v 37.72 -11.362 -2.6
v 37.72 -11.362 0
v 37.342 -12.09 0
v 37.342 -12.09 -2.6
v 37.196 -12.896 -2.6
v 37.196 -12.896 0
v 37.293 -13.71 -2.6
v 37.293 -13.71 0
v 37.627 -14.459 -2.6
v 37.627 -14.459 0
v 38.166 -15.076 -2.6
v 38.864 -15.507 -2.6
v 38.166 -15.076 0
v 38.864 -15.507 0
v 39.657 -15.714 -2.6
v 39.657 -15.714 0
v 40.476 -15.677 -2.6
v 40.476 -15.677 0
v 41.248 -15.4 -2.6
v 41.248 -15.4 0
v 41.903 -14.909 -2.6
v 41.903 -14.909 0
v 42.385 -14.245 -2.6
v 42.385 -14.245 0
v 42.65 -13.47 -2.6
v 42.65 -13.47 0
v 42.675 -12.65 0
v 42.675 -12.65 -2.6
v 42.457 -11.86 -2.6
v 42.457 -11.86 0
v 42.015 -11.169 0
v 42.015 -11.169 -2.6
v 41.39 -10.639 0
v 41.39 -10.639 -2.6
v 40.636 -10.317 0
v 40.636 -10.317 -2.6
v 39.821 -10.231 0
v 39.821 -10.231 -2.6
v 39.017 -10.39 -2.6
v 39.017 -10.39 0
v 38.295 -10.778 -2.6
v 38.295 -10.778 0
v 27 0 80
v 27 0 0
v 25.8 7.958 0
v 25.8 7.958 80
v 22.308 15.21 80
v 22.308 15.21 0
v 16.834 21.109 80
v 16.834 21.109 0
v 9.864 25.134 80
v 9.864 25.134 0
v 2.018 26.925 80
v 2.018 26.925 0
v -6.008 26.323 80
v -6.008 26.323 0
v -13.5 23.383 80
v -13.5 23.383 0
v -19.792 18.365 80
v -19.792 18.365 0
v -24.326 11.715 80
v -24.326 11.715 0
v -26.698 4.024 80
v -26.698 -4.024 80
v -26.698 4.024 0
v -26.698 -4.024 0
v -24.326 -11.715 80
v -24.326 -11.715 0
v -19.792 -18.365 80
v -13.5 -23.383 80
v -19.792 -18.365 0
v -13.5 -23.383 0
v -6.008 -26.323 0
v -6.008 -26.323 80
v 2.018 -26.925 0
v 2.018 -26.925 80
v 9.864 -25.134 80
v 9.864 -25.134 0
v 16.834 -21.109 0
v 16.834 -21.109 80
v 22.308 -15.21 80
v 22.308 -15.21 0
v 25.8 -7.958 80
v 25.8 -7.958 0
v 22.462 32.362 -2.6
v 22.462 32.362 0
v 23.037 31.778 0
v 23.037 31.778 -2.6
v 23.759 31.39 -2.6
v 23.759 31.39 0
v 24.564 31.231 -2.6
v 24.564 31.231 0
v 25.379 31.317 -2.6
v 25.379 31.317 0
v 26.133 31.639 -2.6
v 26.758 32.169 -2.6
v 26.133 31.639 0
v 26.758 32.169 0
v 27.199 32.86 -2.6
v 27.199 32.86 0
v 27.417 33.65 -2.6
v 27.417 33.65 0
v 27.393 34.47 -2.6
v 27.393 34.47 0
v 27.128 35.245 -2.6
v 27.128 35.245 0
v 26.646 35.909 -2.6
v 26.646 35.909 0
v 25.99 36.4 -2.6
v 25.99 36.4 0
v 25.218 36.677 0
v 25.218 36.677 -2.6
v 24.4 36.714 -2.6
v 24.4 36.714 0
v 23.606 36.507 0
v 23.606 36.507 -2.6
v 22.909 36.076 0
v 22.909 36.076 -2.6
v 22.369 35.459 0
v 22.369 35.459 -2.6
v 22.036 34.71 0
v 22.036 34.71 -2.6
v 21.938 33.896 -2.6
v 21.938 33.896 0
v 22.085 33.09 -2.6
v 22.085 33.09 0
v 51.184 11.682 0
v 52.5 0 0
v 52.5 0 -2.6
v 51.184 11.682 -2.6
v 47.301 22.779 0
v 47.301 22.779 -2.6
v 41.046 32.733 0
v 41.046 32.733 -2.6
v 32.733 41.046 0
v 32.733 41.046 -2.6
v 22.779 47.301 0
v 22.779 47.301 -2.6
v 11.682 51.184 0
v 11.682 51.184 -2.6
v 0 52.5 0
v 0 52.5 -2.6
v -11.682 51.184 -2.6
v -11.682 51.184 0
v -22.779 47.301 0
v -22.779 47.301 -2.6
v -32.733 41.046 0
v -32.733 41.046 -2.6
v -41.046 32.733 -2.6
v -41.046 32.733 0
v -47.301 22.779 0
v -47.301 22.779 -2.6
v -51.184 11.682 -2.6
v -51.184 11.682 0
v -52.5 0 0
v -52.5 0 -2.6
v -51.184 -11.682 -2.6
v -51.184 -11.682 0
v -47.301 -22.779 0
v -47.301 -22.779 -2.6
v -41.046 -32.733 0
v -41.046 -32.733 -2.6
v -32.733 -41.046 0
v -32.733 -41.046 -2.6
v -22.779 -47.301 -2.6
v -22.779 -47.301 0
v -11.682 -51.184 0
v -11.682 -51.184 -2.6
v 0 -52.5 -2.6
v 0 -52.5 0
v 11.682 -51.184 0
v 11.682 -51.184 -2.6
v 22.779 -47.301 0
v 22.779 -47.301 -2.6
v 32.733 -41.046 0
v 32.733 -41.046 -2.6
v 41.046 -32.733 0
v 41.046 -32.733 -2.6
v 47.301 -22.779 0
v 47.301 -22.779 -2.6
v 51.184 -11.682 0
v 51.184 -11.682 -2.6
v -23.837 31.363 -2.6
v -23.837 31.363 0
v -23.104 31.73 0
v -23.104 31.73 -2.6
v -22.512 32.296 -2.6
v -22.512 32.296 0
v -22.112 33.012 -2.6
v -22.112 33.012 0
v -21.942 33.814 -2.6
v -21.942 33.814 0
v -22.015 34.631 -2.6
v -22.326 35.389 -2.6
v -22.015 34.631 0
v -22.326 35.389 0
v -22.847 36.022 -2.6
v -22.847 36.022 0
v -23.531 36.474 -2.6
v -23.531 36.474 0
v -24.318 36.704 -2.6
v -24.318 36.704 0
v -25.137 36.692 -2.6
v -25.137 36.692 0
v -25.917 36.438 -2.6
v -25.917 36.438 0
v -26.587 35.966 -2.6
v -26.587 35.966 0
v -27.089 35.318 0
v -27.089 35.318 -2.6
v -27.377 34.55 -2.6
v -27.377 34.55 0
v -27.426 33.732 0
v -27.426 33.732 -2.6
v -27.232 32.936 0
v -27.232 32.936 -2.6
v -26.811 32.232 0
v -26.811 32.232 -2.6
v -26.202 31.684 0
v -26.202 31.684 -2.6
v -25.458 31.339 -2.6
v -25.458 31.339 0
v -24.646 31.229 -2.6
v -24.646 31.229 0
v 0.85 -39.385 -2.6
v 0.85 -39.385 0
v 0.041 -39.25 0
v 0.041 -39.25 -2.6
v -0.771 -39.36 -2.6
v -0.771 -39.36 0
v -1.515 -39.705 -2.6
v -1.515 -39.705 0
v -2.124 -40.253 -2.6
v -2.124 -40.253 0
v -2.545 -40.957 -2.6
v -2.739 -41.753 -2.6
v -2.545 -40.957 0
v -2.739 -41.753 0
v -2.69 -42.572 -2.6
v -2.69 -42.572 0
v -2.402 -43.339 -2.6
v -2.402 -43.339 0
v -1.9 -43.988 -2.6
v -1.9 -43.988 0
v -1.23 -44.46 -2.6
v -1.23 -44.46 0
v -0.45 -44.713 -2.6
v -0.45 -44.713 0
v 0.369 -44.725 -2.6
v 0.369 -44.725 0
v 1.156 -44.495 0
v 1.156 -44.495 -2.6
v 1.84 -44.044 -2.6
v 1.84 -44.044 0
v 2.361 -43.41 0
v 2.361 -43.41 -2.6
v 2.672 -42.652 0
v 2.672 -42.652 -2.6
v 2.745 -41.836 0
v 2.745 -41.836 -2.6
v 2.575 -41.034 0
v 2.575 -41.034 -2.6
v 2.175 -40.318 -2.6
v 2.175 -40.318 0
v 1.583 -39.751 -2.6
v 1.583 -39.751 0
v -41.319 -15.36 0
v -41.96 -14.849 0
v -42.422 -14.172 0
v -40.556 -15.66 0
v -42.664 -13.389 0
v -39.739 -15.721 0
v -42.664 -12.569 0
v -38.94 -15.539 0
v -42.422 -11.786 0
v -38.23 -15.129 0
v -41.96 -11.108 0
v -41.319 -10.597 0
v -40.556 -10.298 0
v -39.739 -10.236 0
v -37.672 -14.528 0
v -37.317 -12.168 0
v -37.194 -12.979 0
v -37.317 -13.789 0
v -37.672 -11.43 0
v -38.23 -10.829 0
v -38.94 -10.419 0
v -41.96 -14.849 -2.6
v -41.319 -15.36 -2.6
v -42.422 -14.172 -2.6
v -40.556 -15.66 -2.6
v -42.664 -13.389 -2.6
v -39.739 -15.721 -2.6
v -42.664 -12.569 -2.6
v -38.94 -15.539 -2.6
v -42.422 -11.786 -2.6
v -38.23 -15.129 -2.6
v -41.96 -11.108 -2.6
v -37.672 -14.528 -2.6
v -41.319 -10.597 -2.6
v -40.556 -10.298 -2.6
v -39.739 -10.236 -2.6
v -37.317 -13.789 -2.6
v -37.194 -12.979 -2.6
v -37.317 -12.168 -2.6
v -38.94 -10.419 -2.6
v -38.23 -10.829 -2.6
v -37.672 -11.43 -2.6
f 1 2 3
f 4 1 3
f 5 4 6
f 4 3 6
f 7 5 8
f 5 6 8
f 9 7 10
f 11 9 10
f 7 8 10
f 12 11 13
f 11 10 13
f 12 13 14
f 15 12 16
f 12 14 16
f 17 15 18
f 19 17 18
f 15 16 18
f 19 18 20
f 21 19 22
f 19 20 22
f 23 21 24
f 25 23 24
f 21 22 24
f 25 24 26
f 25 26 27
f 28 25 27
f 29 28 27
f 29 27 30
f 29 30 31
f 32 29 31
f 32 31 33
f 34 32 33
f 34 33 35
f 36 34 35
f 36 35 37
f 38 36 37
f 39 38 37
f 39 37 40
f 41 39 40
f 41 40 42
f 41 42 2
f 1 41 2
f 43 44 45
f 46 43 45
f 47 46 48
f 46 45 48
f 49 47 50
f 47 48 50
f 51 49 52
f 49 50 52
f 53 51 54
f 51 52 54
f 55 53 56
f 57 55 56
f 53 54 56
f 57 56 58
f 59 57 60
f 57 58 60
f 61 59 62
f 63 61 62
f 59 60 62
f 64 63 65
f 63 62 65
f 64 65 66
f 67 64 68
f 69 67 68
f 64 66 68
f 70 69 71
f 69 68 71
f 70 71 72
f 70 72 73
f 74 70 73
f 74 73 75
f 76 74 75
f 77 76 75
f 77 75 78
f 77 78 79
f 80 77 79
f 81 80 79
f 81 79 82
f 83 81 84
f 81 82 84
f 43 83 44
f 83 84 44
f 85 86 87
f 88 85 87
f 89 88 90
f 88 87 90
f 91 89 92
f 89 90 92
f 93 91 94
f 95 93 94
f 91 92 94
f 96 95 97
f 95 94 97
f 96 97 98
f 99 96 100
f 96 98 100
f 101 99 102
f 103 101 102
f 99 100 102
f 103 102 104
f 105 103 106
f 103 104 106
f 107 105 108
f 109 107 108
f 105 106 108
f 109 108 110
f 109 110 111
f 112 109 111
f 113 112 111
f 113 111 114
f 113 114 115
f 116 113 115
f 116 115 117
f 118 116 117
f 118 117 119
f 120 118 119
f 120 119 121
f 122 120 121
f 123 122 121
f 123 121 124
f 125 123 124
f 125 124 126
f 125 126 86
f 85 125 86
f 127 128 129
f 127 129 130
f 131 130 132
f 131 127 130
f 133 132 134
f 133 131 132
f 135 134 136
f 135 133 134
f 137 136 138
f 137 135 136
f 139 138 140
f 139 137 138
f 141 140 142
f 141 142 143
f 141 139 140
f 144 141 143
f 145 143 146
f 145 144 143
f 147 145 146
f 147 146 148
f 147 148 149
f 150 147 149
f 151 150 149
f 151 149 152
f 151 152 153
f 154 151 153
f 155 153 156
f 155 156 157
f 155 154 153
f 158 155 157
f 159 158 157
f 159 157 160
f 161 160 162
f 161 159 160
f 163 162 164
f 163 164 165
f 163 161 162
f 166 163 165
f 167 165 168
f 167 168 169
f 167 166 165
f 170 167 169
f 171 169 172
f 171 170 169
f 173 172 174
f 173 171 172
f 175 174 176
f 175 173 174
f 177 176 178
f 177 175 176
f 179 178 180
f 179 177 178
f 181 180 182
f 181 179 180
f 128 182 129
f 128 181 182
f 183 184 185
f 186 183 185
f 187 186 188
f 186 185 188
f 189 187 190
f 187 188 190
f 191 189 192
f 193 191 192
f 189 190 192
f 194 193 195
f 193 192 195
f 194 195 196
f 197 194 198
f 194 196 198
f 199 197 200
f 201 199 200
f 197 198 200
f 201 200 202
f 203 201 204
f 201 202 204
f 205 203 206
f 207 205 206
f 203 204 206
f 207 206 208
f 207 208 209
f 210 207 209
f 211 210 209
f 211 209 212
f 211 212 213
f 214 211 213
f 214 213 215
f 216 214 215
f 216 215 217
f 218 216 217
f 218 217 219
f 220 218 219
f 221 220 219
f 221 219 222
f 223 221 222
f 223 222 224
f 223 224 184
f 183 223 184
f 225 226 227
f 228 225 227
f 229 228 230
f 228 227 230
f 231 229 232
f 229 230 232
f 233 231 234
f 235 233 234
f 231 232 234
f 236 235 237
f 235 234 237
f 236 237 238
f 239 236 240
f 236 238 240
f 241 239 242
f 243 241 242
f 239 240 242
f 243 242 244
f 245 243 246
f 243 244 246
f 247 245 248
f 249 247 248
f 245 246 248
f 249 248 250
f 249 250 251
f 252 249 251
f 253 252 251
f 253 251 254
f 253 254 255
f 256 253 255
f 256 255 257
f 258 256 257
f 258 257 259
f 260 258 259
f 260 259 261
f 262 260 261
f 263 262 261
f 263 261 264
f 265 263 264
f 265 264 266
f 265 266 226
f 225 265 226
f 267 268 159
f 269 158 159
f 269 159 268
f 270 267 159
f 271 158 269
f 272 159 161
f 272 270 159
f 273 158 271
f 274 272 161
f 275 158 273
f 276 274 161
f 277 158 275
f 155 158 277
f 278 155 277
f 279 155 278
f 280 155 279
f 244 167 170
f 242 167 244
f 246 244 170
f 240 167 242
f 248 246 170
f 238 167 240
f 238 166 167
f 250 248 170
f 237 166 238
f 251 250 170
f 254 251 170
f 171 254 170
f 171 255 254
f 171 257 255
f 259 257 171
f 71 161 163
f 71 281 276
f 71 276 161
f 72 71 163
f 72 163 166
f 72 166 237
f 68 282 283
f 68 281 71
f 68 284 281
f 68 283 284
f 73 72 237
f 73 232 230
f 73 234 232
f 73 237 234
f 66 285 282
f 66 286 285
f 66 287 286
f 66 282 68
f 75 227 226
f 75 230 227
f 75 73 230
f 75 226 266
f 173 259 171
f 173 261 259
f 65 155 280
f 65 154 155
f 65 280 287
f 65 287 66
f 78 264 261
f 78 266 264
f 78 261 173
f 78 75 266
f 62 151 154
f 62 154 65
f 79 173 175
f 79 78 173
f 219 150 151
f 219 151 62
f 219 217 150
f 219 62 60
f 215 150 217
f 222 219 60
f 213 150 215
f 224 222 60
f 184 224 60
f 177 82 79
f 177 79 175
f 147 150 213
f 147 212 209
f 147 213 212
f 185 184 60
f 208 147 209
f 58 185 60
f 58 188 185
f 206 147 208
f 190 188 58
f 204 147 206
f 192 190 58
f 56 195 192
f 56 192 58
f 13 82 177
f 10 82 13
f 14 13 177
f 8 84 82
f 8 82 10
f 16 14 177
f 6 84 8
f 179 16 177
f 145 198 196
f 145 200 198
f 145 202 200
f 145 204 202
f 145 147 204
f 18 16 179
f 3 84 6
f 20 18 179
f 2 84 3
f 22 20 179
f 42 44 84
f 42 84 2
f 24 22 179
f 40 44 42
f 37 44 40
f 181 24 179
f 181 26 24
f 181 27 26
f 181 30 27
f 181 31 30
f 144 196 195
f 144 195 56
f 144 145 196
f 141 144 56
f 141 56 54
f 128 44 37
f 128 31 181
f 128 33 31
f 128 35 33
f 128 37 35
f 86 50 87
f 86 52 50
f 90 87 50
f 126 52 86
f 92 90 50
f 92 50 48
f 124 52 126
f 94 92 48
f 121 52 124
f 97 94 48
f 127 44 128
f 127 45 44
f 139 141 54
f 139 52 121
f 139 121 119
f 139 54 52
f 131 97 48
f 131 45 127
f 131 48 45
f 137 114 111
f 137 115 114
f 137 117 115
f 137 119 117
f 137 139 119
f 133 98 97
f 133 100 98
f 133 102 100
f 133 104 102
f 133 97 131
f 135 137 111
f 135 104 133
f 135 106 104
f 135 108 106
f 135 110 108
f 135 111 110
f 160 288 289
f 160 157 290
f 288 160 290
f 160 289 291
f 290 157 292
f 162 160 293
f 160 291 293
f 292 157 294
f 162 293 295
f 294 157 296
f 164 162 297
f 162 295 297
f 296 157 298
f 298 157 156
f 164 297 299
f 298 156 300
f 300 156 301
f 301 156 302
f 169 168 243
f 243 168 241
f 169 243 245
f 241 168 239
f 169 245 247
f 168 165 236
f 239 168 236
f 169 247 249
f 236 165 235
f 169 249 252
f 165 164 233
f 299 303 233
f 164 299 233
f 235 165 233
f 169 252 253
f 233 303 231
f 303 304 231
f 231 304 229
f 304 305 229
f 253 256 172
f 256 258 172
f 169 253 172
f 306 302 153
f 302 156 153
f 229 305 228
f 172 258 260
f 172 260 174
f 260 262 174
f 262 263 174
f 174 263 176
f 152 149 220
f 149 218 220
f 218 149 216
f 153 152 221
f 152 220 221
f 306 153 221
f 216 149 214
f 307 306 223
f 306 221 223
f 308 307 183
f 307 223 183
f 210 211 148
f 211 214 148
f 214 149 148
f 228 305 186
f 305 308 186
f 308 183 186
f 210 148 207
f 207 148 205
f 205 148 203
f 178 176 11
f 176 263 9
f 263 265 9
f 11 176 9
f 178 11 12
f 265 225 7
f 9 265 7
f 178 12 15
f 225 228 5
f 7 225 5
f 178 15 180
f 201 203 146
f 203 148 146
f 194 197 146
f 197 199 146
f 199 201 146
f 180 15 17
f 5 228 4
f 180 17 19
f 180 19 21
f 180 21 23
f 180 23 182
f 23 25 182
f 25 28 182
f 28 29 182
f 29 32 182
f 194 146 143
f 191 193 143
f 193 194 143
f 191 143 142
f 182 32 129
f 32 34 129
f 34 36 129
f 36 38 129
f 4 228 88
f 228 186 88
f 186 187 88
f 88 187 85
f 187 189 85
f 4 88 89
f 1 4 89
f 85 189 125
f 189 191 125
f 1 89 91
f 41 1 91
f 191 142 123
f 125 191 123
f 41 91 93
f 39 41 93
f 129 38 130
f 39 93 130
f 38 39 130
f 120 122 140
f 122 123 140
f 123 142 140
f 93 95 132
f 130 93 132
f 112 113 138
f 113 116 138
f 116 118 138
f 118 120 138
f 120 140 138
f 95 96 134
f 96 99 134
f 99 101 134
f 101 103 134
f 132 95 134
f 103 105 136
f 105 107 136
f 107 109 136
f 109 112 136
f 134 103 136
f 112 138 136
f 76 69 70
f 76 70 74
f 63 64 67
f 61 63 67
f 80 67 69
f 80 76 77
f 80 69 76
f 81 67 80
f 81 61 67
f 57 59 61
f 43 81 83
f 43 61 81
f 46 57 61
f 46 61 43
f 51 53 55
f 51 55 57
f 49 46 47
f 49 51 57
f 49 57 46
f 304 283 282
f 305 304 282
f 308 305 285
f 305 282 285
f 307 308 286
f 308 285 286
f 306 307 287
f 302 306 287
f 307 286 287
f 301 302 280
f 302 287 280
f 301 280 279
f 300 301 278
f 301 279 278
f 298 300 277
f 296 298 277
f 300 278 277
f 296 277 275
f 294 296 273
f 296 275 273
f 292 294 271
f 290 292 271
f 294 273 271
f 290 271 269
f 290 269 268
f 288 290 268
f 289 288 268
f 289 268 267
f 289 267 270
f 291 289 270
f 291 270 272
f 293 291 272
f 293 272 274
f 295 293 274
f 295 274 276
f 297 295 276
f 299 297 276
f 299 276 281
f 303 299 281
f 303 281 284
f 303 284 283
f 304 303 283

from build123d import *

# Parameters (mm, degrees)
SKETCH1_R           = 52.5
BOSS_EXTRUDE1_DEPTH = 2.6
SKETCH2_R           = 27
BOSS_EXTRUDE2_DEPTH = 80
SKETCH3_R           = 2.75
CUT_EXTRUDE1_DEPTH  = 110.144399765
CIRPATTERN1_COUNT   = 5


with BuildPart() as part:
    # Sketch1 → Boss-Extrude1 (new body)
    with BuildSketch(Plane.XY):
        Circle(SKETCH1_R)
    extrude(amount=-BOSS_EXTRUDE1_DEPTH)

    # Sketch2 → Boss-Extrude2 (add)
    with BuildSketch(Plane.XY):
        Circle(SKETCH2_R)
    extrude(amount=BOSS_EXTRUDE2_DEPTH)

    # Sketch3 → Cut-Extrude1 (cut, through all)
    with BuildSketch(Plane.XY):
        with Locations((-39.944373684, -12.978713764)):
            Circle(SKETCH3_R)
    cut_extrude1 = extrude(amount=-CUT_EXTRUDE1_DEPTH, mode=Mode.SUBTRACT)

    # CirPattern1: Cut-Extrude1 ×5 about axis
    cirpattern1_axis = Axis((0, 0, 0), (0, 0, 1))
    for i in range(1, CIRPATTERN1_COUNT):
        add(cut_extrude1.rotate(cirpattern1_axis, i * 360 / CIRPATTERN1_COUNT), mode=Mode.SUBTRACT)


solid = part.part
